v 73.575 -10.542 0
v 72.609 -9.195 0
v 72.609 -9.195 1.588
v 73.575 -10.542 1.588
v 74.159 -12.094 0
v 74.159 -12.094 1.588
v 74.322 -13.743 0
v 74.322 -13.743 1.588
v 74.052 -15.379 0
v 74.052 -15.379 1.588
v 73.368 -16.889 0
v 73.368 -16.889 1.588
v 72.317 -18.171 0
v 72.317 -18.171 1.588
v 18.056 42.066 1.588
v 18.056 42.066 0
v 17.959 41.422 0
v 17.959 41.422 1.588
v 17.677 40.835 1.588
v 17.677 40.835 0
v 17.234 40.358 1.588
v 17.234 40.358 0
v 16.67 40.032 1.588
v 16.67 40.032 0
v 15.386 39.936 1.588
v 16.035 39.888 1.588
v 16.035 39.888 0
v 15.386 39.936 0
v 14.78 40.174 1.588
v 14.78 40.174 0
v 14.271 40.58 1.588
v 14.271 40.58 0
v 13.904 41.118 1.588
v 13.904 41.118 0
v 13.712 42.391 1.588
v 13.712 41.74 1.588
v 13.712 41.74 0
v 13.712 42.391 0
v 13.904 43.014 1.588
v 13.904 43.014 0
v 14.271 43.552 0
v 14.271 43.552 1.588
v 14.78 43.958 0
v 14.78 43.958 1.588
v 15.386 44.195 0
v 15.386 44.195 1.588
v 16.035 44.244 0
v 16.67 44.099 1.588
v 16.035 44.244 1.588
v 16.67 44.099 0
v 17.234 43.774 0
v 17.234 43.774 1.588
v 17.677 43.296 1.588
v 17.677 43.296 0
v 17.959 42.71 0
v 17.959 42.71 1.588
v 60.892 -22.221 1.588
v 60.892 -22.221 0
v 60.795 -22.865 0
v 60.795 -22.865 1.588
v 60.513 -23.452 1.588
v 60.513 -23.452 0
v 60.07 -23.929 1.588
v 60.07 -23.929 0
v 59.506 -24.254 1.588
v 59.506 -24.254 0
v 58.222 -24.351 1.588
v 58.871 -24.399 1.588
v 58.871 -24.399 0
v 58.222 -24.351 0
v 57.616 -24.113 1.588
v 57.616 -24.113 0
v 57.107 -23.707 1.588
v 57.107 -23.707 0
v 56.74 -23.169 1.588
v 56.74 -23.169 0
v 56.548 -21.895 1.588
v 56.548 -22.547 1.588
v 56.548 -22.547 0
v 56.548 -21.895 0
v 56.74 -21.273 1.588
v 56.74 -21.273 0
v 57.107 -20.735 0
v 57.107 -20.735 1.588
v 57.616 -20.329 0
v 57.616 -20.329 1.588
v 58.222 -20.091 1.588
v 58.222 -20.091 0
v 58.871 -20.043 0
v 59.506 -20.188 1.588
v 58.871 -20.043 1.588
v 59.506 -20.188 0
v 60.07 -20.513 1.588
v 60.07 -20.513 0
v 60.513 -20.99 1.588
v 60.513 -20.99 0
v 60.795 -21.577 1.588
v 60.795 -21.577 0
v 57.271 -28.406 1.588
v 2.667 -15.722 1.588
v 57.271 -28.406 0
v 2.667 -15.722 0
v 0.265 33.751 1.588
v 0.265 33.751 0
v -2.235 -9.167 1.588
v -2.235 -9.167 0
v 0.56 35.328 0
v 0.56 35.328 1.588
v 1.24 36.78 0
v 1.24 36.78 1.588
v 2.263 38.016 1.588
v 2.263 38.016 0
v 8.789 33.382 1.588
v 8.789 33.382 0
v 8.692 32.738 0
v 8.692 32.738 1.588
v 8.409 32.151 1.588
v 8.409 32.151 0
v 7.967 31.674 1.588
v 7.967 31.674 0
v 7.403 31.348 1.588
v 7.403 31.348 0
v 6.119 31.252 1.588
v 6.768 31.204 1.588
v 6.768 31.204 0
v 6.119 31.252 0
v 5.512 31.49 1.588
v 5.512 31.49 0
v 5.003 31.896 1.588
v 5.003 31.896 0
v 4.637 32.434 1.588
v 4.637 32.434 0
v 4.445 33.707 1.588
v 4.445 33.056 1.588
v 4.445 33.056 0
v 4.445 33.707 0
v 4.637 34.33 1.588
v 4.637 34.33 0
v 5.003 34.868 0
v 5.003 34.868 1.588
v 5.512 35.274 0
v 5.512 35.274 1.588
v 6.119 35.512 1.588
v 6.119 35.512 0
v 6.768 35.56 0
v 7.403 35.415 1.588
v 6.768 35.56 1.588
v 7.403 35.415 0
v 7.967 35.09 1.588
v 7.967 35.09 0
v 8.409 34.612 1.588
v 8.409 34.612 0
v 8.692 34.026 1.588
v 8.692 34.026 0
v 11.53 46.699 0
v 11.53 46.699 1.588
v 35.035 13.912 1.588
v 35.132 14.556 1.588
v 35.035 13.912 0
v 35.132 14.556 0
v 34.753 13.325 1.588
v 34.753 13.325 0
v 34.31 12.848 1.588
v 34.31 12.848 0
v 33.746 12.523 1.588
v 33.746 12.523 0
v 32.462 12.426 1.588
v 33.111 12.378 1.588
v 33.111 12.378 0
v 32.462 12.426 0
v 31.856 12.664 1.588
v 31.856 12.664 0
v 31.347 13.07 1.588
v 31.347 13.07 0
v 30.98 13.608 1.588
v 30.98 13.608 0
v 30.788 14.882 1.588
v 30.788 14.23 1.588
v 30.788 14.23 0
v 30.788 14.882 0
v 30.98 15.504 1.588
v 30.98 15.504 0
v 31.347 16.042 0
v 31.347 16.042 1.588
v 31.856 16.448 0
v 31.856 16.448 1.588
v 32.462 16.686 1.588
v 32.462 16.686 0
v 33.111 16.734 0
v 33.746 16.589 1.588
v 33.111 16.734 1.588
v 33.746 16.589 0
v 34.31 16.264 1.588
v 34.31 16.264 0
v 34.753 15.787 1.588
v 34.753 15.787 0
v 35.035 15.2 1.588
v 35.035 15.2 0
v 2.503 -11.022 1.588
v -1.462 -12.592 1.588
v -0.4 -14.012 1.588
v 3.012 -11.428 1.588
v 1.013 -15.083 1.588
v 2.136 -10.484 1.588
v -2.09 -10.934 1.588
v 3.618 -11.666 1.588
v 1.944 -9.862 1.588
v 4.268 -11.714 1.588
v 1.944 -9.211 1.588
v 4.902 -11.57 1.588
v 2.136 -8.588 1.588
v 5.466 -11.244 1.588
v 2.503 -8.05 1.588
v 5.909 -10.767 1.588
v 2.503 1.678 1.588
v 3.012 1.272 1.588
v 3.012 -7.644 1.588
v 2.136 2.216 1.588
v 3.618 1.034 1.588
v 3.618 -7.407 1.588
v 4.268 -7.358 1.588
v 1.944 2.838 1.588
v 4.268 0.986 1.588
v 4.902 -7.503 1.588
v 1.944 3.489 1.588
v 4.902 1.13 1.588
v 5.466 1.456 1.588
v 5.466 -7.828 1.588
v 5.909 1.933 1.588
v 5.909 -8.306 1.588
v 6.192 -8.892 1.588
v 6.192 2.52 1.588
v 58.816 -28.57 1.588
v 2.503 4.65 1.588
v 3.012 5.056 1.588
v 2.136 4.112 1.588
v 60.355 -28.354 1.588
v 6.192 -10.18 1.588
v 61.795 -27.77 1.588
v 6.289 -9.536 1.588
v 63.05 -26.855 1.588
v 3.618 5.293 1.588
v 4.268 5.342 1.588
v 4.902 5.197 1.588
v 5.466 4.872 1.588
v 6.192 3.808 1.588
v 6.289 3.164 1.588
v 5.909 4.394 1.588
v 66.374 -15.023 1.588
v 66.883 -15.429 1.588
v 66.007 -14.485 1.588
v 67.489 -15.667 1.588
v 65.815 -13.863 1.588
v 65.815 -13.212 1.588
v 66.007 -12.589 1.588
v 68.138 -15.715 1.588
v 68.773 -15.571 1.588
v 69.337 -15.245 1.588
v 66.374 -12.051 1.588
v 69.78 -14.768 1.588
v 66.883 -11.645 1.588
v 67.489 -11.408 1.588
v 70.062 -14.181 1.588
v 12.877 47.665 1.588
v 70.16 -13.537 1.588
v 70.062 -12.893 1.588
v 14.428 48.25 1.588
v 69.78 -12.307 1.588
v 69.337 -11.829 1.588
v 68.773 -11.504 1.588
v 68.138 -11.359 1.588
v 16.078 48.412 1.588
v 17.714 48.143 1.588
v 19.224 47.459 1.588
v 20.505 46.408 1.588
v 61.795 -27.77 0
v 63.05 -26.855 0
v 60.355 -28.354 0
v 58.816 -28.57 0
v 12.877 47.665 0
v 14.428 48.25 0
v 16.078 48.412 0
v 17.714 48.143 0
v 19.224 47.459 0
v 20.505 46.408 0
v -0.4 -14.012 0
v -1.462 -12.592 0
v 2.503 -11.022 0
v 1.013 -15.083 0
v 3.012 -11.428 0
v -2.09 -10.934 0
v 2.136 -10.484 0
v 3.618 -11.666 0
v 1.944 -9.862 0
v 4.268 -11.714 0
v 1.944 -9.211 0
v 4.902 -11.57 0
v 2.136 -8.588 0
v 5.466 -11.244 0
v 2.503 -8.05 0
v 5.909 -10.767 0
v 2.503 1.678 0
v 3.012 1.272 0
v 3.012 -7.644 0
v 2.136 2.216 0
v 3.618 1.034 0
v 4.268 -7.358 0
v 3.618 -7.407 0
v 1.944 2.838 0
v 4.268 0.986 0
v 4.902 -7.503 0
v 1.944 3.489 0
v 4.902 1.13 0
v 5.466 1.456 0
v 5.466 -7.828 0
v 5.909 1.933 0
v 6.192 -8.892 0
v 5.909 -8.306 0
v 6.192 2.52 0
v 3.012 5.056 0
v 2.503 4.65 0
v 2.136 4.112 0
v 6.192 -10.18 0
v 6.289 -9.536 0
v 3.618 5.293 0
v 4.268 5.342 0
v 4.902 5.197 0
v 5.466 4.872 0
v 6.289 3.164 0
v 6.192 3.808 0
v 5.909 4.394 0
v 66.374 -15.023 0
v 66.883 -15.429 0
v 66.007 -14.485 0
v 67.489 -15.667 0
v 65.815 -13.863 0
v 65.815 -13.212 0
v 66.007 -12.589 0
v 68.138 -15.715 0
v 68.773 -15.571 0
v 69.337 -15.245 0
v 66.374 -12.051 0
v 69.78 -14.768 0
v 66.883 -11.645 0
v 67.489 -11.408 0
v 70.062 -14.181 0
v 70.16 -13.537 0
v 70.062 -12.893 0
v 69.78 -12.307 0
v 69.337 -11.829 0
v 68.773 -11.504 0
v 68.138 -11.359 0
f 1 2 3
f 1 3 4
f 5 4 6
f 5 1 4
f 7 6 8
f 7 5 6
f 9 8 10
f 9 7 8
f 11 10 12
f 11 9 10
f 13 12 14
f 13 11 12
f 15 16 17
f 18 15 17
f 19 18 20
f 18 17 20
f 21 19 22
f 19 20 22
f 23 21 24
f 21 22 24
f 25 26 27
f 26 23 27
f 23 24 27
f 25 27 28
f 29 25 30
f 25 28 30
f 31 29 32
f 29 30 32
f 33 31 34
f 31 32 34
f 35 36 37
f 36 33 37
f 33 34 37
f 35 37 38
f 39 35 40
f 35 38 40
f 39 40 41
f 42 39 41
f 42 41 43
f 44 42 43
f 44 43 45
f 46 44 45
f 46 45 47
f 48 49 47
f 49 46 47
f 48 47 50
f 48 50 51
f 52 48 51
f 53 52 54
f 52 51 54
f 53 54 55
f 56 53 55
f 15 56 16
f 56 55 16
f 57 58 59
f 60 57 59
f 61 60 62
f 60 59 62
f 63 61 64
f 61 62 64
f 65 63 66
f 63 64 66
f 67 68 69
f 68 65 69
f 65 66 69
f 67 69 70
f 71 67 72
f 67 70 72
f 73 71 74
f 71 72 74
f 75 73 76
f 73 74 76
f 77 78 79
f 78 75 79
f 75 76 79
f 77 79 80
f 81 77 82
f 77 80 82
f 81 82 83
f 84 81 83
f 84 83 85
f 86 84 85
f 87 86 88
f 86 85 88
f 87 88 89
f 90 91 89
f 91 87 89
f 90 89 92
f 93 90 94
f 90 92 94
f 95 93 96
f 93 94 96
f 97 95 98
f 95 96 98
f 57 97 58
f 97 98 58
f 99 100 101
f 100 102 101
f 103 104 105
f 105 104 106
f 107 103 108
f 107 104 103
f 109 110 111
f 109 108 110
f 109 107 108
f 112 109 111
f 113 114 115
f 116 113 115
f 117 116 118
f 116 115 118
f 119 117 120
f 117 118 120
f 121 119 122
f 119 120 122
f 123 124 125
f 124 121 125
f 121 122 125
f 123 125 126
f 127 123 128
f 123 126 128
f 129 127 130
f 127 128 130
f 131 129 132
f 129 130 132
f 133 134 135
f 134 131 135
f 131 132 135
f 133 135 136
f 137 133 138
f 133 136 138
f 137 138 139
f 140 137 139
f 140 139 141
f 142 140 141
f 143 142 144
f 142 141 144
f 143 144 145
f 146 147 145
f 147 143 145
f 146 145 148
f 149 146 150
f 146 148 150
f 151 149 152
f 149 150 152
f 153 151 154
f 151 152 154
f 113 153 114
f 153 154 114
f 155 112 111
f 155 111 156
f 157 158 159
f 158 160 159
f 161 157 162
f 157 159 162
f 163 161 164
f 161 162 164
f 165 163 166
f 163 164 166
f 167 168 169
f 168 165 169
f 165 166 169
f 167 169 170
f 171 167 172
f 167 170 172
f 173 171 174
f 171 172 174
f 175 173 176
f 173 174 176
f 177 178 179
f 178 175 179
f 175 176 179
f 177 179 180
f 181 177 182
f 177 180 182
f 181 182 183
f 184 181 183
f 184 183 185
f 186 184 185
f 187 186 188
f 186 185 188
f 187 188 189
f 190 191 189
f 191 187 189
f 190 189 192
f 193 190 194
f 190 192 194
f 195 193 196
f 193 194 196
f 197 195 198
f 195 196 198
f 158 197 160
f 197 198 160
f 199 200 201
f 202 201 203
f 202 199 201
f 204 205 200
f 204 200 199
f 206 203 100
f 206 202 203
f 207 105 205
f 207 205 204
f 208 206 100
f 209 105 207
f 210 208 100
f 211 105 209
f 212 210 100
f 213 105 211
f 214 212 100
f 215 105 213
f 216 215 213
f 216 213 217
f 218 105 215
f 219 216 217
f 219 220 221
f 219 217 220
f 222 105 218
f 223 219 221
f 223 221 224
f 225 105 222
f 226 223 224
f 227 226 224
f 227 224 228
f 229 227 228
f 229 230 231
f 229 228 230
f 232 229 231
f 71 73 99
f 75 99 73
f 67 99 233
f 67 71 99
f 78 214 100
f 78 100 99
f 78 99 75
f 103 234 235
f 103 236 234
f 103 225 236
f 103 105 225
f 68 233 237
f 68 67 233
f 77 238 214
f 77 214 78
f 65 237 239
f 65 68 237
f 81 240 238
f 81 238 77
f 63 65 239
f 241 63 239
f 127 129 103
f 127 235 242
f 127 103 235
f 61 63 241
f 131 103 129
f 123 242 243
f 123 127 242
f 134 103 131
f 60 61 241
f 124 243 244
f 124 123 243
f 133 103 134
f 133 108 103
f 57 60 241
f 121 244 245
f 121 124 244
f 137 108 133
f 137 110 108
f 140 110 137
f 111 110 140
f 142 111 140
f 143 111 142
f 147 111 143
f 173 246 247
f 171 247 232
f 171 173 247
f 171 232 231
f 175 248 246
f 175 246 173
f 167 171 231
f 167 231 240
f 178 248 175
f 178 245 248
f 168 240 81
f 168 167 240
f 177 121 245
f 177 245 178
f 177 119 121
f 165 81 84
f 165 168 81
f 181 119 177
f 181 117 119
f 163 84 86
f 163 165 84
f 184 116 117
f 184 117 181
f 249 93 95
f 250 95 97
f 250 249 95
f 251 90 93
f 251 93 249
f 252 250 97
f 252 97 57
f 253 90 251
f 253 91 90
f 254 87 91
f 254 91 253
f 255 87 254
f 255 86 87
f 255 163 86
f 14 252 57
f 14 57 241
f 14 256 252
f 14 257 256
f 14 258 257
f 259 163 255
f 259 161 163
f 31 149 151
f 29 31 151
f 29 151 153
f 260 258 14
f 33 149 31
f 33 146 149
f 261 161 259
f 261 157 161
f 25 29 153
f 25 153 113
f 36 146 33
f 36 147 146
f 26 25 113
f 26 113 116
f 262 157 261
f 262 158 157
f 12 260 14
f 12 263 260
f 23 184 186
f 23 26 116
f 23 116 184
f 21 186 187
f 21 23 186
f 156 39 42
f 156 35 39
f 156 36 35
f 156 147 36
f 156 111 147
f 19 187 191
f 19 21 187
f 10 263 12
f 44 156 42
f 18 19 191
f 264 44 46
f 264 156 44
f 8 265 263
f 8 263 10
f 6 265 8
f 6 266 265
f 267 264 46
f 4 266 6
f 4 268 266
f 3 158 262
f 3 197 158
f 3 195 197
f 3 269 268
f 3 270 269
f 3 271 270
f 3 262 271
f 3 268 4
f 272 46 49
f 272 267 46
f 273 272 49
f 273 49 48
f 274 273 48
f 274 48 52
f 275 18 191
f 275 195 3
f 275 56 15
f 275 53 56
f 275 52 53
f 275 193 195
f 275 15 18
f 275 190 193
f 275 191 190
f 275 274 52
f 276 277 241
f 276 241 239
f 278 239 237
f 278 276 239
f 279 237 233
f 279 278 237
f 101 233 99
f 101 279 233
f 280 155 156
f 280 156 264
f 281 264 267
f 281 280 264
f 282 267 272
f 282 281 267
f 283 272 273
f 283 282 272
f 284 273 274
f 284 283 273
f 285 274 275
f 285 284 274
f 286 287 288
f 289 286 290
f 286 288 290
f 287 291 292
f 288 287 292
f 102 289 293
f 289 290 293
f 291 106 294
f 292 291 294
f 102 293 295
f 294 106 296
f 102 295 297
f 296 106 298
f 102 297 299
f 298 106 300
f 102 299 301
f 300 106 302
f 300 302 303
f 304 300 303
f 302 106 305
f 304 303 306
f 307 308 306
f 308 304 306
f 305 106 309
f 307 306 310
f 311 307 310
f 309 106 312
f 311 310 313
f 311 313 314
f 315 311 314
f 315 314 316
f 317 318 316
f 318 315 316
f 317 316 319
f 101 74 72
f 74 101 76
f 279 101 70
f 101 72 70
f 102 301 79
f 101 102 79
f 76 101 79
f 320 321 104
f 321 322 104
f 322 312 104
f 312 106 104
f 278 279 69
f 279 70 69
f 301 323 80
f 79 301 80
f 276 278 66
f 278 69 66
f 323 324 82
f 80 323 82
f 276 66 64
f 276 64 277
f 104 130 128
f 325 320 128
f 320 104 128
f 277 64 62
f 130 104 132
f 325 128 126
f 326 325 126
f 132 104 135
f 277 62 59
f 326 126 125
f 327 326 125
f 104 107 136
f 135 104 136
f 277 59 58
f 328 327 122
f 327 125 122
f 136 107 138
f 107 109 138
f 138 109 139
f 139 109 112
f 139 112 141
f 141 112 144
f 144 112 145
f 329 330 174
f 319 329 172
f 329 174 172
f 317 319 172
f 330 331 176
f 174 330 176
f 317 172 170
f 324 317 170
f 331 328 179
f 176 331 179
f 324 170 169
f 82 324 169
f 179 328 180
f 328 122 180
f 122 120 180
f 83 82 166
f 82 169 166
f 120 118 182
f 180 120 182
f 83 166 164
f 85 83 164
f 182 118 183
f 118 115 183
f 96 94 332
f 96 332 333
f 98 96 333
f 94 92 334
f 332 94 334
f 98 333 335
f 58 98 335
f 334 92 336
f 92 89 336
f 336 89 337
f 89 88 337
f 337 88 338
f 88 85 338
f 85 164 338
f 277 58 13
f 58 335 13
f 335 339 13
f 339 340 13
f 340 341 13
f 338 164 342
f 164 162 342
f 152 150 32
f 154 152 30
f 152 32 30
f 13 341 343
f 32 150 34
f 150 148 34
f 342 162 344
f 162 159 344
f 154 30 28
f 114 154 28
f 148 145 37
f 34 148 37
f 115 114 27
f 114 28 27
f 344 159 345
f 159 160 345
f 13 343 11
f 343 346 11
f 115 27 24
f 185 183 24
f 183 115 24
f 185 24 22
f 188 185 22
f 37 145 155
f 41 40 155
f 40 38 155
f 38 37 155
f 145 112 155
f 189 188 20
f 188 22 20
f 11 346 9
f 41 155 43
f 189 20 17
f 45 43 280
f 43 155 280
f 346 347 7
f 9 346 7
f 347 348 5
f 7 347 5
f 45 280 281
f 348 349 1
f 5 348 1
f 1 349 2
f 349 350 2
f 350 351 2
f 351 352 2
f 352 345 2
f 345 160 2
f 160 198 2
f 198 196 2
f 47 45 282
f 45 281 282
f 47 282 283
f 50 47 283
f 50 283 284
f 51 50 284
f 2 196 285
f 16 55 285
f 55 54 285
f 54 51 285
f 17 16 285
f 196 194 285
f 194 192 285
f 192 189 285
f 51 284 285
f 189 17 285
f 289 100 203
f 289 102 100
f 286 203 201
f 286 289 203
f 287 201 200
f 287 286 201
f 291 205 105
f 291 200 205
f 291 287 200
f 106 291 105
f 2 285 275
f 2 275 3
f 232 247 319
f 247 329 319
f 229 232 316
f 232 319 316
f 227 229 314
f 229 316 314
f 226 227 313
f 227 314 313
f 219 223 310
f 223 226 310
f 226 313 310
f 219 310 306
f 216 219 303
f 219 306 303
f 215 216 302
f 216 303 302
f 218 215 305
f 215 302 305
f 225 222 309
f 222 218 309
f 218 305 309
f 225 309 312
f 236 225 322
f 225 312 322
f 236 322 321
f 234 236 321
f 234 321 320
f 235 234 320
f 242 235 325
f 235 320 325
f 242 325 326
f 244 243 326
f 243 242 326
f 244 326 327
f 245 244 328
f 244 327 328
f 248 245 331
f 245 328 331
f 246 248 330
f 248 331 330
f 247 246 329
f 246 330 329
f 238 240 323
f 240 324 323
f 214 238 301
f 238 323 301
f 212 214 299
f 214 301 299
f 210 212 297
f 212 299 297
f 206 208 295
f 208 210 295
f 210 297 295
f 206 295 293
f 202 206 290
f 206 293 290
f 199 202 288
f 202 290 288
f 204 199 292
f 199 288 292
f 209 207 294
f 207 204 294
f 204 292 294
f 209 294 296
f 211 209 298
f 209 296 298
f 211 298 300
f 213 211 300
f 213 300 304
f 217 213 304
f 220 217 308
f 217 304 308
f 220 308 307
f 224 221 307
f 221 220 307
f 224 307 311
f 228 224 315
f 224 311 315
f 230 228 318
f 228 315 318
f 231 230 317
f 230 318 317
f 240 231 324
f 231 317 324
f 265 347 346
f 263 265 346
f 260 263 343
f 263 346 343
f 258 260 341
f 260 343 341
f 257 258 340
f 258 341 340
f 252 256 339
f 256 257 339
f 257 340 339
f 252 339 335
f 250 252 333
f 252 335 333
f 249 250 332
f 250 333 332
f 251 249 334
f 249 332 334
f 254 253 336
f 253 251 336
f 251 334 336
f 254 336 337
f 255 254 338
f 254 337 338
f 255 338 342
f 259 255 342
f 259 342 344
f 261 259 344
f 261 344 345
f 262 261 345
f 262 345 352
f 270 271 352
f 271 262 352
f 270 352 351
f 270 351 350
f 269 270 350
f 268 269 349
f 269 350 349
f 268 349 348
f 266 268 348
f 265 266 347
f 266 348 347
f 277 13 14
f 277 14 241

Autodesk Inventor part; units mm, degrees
ref_plane "YZ Plane" through (0, 0, 0) normal (1, 0, 0) x (0, 1, 0)
ref_plane "XZ Plane" through (0, 0, 0) normal (0, 1, 0) x (-1, 0, 0)
ref_plane "XY Plane" through (0, 0, 0) normal (0, 0, 1) x (1, 0, 0)
sketch "Sketch1" plane through (0, 0, 0) normal (0, 0, 1) x (1, 0, 0)
  circle A0 centre (58.7079, -22.221) radius 2.1844
  circle A1 centre (67.9751, -13.5372) radius 2.1844
  circle A2 centre (4.1043, 3.1638) radius 2.1844
  circle A3 centre (4.1043, -9.5362) radius 2.1844
  circle A4 centre (15.8718, 42.0658) radius 2.1844
  circle A5 centre (6.6046, 33.3819) radius 2.1844
  arc A6 (2.2627, 38.0155) -> (0.2654, 33.7512) centre (6.6046, 33.3819) ccw
  arc A7 (20.5054, 46.4077) -> (11.5299, 46.6994) centre (15.8718, 42.0658) ccw
  arc A8 (-2.235, -9.1669) -> (2.6674, -15.7215) centre (4.1043, -9.5362) ccw
  arc A9 (57.2711, -28.4063) -> (63.0499, -26.8546) centre (58.7079, -22.221) ccw
  arc A10 (72.317, -18.1707) -> (72.6087, -9.1952) centre (67.9751, -13.5372) ccw
  line L0 (20.5054, 46.4077) -> (72.6087, -9.1952)
  line L1 (72.317, -18.1707) -> (63.0499, -26.8546)
  line L2 (2.6674, -15.7215) -> (57.2711, -28.4063)
  line L3 (0.2654, 33.7512) -> (-2.235, -9.1669)
  line L4 (2.2627, 38.0155) -> (11.5299, 46.6994)
  circle A11 centre (32.9479, 14.556) radius 2.1844
  dimension "d8" = 12.7
  dimension "d9" = 12.7
  dimension "d10" = 12.7
  dimension "d11" = 12.7
  dimension "d12" = 12.7
  dimension "d14" = 4.3688
extrude "Extrusion1" add sketch "Sketch1" along normal blind 1.5875
properties part number "2-Gearbox"
